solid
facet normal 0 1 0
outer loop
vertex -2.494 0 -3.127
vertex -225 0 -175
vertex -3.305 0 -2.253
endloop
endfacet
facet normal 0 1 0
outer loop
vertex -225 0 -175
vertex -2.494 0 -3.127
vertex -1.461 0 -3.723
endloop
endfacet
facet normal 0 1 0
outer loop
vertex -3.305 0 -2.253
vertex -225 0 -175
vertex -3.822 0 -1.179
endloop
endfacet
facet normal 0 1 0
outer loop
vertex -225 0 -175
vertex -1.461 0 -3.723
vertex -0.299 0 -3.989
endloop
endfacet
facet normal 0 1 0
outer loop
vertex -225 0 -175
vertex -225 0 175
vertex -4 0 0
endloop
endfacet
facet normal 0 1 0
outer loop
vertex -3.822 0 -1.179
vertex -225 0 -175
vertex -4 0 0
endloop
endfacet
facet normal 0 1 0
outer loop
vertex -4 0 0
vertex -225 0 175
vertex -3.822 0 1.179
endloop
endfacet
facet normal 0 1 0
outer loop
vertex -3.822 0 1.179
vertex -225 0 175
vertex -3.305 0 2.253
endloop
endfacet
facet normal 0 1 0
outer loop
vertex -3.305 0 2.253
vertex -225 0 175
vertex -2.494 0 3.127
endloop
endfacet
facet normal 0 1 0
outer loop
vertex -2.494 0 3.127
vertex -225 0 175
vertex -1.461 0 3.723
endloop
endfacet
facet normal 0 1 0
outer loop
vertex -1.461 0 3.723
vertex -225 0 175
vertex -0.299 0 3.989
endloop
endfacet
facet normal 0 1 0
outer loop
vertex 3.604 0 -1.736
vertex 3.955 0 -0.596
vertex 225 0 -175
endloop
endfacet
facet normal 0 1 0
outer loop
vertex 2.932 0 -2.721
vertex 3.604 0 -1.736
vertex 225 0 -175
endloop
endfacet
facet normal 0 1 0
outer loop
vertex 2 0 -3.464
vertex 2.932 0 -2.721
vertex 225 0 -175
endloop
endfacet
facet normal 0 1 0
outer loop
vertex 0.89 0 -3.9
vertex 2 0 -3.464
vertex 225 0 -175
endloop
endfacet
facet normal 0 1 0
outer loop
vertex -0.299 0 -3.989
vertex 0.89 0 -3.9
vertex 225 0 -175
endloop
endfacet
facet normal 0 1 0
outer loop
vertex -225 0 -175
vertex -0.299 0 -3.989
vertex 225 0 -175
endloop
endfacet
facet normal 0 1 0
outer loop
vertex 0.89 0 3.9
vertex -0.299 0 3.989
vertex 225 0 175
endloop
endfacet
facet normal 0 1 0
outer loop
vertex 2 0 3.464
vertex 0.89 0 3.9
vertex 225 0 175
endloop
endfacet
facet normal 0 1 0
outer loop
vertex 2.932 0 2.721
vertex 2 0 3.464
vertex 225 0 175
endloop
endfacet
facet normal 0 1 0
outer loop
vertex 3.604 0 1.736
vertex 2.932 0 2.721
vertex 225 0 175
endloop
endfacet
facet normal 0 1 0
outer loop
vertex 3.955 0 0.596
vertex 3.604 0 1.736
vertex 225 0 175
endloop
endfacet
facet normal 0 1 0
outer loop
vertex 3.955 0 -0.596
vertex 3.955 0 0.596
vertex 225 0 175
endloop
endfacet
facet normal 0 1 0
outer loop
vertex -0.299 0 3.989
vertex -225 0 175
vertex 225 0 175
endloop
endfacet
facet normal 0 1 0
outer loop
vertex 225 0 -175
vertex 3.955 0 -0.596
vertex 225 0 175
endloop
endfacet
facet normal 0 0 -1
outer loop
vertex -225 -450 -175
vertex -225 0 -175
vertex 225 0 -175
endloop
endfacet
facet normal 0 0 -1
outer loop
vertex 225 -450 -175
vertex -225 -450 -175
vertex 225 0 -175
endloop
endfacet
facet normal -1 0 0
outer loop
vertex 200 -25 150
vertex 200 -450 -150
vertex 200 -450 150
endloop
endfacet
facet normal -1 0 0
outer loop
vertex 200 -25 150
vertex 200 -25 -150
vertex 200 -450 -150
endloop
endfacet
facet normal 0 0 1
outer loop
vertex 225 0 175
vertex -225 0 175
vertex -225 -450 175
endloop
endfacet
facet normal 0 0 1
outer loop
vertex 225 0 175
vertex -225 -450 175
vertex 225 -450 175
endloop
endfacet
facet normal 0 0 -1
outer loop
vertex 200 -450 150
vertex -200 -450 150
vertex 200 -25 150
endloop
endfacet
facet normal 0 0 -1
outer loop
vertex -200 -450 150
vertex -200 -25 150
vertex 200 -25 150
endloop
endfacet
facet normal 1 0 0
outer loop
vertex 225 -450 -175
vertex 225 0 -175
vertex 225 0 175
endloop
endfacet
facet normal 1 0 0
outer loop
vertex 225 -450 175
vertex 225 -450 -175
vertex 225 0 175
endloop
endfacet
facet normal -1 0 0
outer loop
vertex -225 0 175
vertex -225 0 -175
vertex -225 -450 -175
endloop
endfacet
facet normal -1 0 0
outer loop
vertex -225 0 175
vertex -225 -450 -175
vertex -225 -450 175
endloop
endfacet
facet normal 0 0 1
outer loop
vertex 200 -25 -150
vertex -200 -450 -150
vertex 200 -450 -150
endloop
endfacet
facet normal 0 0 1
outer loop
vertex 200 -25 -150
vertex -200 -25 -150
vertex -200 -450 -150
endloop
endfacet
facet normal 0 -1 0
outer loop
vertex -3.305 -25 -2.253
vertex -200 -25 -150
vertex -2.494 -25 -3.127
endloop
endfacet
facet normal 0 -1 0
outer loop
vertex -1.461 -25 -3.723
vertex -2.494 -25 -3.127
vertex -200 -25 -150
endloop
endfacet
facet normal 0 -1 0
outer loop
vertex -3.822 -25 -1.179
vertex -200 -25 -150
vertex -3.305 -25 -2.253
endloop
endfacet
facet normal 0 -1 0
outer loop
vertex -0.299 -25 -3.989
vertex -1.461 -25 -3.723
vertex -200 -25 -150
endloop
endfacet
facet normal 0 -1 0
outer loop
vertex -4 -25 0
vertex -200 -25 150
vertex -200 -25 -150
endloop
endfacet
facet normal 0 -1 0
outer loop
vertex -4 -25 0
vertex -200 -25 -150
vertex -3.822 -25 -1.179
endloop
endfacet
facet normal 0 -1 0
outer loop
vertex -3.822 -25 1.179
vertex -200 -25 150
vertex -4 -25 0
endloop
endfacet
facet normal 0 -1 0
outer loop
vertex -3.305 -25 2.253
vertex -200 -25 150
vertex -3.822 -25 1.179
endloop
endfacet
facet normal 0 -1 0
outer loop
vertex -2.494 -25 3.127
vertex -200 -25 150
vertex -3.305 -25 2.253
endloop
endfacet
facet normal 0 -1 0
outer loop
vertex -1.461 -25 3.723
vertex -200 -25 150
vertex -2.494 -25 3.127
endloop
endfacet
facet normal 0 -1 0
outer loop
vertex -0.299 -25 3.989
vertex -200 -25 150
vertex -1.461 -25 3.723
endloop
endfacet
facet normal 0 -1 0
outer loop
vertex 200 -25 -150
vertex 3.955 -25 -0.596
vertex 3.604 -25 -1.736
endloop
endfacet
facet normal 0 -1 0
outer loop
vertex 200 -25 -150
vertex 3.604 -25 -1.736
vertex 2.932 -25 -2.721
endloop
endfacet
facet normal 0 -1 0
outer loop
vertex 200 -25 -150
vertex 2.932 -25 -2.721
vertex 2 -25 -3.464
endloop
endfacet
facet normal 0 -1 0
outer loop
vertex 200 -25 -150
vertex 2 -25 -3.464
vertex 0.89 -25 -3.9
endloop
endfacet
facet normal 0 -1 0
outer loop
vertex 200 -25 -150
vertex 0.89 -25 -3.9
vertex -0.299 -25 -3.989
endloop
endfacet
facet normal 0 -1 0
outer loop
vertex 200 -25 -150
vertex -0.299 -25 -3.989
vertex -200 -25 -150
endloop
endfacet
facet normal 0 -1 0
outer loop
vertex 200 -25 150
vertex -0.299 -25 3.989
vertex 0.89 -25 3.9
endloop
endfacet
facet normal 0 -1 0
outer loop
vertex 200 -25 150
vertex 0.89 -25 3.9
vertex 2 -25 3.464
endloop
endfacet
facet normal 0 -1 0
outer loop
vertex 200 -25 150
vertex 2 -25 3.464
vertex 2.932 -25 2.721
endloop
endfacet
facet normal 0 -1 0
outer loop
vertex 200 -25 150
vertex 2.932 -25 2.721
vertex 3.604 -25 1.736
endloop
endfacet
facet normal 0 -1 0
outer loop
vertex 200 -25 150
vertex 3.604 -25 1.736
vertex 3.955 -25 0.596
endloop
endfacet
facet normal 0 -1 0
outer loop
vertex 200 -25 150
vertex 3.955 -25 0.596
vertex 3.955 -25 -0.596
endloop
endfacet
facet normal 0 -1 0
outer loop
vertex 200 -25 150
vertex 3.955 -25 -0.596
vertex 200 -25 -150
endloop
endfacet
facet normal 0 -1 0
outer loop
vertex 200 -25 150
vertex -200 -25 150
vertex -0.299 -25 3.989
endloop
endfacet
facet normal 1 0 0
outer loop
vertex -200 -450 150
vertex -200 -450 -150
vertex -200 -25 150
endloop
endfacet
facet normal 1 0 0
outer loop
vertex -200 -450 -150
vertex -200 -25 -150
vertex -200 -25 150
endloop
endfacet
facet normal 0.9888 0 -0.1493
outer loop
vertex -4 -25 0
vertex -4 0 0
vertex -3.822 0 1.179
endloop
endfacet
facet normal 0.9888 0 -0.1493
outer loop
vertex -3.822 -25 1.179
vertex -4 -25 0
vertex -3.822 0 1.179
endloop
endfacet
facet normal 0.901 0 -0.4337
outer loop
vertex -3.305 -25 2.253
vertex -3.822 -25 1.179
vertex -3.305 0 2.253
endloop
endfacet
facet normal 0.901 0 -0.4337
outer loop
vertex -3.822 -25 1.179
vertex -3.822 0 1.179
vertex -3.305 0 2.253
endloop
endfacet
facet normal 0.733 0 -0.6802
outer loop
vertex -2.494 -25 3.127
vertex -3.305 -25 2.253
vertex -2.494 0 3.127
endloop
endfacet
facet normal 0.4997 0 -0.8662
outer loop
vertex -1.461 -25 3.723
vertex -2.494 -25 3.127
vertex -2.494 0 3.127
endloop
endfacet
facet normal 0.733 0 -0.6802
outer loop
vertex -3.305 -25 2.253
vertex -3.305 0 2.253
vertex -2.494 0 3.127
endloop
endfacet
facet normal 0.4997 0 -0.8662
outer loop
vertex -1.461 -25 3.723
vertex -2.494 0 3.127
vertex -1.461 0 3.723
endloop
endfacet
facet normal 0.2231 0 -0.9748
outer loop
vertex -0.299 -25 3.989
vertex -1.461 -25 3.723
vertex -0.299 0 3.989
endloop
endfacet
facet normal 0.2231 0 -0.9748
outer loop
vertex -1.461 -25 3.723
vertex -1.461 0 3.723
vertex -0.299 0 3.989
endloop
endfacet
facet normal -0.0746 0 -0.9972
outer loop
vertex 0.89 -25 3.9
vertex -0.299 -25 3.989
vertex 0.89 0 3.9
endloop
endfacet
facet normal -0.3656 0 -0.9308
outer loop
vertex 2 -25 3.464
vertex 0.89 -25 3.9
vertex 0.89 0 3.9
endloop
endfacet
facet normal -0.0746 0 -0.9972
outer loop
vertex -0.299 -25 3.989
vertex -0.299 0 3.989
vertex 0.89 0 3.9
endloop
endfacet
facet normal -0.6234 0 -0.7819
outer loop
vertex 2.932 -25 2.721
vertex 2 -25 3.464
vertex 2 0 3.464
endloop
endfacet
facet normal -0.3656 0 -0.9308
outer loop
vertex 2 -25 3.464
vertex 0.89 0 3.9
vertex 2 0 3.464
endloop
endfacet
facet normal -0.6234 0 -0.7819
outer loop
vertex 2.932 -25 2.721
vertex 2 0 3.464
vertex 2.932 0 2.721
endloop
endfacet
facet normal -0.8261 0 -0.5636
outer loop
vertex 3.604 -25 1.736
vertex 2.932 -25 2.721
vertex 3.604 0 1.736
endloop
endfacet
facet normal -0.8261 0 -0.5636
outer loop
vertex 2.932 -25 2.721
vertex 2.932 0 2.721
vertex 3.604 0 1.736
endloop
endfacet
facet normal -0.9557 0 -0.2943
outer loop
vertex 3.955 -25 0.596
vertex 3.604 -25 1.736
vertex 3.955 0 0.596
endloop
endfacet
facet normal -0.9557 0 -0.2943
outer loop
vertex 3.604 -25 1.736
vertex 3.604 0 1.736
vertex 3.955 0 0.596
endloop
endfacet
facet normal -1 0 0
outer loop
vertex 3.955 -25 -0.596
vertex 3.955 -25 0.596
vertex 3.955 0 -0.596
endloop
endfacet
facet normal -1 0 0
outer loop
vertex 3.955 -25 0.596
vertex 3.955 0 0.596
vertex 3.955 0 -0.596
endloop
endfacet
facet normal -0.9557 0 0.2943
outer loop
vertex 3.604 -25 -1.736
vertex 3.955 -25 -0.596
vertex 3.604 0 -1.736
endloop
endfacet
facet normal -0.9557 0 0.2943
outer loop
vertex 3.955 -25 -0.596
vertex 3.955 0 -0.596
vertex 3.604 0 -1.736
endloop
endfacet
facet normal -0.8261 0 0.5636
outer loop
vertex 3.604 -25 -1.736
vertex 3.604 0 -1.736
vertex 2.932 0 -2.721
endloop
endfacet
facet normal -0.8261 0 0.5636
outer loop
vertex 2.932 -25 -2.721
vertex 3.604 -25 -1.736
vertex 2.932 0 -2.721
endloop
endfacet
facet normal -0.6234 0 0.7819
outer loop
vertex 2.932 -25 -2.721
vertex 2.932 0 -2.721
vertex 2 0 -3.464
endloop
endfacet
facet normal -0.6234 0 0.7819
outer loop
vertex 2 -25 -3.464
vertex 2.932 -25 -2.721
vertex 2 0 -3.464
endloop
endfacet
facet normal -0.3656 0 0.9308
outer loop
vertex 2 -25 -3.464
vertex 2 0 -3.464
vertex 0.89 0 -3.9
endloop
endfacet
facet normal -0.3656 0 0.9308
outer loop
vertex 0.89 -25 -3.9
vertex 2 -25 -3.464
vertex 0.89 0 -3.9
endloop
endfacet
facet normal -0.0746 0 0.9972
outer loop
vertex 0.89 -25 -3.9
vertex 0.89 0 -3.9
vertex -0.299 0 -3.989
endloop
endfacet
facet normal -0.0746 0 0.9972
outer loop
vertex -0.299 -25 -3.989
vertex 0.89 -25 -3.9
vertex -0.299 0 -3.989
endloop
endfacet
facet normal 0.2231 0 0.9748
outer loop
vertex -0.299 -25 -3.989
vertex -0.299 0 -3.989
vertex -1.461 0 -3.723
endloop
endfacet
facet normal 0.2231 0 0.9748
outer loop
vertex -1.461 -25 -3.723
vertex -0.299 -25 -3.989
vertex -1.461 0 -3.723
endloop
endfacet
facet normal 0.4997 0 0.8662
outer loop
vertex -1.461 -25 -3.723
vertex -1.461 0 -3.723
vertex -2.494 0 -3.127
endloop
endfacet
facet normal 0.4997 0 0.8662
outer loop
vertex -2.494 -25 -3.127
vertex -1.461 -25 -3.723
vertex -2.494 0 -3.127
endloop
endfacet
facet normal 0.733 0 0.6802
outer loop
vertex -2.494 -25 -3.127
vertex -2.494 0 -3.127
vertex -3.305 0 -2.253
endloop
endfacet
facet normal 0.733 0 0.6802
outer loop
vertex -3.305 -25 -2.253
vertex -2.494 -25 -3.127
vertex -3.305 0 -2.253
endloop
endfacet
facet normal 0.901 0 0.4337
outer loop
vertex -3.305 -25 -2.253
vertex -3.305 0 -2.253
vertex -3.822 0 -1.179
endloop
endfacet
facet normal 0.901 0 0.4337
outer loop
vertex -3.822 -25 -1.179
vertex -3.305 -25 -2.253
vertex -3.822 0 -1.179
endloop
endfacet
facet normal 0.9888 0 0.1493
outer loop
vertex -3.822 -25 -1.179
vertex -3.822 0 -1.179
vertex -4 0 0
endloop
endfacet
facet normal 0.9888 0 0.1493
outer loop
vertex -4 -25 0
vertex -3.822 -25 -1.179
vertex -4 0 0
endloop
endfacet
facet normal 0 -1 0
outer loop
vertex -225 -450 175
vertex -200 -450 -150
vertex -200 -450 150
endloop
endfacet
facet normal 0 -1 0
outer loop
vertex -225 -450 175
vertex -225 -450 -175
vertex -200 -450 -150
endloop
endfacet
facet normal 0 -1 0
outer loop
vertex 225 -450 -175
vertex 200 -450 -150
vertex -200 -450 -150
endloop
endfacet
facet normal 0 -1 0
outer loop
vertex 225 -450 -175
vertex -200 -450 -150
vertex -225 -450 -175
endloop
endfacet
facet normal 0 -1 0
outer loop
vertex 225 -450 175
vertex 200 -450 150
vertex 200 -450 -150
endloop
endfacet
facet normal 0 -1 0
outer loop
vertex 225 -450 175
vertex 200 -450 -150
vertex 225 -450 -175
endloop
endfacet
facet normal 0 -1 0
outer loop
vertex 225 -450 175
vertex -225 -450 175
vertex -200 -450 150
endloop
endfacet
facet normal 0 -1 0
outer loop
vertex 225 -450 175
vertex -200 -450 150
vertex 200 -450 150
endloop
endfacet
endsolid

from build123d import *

# Parameters (mm, degrees)
F0_W     = 450
F0_H     = 350
F1_DEPTH = 450
F2_T     = -25
F3_R     = 4
F4_DEPTH = 450.001


with BuildPart() as f1:
    # F0 (on Front) → F1 (new body)
    with BuildSketch(Plane.XZ):
        Rectangle(F0_W, F0_H)
    extrude(amount=F1_DEPTH)

    # F2
    f2_openings = [f1.faces().sort_by_distance(p)[0] for p in [
        (0, -450, 0),
    ]]
    offset(amount=F2_T, openings=f2_openings)

    # F3 (on face) → F4 (cut, through all)
    with BuildSketch(Plane(origin=(0, 0, 0), x_dir=(-1, 0, 0), z_dir=(0, 1, 0))):
        Circle(F3_R)
    extrude(amount=-F4_DEPTH, mode=Mode.SUBTRACT)


solid = f1.part
